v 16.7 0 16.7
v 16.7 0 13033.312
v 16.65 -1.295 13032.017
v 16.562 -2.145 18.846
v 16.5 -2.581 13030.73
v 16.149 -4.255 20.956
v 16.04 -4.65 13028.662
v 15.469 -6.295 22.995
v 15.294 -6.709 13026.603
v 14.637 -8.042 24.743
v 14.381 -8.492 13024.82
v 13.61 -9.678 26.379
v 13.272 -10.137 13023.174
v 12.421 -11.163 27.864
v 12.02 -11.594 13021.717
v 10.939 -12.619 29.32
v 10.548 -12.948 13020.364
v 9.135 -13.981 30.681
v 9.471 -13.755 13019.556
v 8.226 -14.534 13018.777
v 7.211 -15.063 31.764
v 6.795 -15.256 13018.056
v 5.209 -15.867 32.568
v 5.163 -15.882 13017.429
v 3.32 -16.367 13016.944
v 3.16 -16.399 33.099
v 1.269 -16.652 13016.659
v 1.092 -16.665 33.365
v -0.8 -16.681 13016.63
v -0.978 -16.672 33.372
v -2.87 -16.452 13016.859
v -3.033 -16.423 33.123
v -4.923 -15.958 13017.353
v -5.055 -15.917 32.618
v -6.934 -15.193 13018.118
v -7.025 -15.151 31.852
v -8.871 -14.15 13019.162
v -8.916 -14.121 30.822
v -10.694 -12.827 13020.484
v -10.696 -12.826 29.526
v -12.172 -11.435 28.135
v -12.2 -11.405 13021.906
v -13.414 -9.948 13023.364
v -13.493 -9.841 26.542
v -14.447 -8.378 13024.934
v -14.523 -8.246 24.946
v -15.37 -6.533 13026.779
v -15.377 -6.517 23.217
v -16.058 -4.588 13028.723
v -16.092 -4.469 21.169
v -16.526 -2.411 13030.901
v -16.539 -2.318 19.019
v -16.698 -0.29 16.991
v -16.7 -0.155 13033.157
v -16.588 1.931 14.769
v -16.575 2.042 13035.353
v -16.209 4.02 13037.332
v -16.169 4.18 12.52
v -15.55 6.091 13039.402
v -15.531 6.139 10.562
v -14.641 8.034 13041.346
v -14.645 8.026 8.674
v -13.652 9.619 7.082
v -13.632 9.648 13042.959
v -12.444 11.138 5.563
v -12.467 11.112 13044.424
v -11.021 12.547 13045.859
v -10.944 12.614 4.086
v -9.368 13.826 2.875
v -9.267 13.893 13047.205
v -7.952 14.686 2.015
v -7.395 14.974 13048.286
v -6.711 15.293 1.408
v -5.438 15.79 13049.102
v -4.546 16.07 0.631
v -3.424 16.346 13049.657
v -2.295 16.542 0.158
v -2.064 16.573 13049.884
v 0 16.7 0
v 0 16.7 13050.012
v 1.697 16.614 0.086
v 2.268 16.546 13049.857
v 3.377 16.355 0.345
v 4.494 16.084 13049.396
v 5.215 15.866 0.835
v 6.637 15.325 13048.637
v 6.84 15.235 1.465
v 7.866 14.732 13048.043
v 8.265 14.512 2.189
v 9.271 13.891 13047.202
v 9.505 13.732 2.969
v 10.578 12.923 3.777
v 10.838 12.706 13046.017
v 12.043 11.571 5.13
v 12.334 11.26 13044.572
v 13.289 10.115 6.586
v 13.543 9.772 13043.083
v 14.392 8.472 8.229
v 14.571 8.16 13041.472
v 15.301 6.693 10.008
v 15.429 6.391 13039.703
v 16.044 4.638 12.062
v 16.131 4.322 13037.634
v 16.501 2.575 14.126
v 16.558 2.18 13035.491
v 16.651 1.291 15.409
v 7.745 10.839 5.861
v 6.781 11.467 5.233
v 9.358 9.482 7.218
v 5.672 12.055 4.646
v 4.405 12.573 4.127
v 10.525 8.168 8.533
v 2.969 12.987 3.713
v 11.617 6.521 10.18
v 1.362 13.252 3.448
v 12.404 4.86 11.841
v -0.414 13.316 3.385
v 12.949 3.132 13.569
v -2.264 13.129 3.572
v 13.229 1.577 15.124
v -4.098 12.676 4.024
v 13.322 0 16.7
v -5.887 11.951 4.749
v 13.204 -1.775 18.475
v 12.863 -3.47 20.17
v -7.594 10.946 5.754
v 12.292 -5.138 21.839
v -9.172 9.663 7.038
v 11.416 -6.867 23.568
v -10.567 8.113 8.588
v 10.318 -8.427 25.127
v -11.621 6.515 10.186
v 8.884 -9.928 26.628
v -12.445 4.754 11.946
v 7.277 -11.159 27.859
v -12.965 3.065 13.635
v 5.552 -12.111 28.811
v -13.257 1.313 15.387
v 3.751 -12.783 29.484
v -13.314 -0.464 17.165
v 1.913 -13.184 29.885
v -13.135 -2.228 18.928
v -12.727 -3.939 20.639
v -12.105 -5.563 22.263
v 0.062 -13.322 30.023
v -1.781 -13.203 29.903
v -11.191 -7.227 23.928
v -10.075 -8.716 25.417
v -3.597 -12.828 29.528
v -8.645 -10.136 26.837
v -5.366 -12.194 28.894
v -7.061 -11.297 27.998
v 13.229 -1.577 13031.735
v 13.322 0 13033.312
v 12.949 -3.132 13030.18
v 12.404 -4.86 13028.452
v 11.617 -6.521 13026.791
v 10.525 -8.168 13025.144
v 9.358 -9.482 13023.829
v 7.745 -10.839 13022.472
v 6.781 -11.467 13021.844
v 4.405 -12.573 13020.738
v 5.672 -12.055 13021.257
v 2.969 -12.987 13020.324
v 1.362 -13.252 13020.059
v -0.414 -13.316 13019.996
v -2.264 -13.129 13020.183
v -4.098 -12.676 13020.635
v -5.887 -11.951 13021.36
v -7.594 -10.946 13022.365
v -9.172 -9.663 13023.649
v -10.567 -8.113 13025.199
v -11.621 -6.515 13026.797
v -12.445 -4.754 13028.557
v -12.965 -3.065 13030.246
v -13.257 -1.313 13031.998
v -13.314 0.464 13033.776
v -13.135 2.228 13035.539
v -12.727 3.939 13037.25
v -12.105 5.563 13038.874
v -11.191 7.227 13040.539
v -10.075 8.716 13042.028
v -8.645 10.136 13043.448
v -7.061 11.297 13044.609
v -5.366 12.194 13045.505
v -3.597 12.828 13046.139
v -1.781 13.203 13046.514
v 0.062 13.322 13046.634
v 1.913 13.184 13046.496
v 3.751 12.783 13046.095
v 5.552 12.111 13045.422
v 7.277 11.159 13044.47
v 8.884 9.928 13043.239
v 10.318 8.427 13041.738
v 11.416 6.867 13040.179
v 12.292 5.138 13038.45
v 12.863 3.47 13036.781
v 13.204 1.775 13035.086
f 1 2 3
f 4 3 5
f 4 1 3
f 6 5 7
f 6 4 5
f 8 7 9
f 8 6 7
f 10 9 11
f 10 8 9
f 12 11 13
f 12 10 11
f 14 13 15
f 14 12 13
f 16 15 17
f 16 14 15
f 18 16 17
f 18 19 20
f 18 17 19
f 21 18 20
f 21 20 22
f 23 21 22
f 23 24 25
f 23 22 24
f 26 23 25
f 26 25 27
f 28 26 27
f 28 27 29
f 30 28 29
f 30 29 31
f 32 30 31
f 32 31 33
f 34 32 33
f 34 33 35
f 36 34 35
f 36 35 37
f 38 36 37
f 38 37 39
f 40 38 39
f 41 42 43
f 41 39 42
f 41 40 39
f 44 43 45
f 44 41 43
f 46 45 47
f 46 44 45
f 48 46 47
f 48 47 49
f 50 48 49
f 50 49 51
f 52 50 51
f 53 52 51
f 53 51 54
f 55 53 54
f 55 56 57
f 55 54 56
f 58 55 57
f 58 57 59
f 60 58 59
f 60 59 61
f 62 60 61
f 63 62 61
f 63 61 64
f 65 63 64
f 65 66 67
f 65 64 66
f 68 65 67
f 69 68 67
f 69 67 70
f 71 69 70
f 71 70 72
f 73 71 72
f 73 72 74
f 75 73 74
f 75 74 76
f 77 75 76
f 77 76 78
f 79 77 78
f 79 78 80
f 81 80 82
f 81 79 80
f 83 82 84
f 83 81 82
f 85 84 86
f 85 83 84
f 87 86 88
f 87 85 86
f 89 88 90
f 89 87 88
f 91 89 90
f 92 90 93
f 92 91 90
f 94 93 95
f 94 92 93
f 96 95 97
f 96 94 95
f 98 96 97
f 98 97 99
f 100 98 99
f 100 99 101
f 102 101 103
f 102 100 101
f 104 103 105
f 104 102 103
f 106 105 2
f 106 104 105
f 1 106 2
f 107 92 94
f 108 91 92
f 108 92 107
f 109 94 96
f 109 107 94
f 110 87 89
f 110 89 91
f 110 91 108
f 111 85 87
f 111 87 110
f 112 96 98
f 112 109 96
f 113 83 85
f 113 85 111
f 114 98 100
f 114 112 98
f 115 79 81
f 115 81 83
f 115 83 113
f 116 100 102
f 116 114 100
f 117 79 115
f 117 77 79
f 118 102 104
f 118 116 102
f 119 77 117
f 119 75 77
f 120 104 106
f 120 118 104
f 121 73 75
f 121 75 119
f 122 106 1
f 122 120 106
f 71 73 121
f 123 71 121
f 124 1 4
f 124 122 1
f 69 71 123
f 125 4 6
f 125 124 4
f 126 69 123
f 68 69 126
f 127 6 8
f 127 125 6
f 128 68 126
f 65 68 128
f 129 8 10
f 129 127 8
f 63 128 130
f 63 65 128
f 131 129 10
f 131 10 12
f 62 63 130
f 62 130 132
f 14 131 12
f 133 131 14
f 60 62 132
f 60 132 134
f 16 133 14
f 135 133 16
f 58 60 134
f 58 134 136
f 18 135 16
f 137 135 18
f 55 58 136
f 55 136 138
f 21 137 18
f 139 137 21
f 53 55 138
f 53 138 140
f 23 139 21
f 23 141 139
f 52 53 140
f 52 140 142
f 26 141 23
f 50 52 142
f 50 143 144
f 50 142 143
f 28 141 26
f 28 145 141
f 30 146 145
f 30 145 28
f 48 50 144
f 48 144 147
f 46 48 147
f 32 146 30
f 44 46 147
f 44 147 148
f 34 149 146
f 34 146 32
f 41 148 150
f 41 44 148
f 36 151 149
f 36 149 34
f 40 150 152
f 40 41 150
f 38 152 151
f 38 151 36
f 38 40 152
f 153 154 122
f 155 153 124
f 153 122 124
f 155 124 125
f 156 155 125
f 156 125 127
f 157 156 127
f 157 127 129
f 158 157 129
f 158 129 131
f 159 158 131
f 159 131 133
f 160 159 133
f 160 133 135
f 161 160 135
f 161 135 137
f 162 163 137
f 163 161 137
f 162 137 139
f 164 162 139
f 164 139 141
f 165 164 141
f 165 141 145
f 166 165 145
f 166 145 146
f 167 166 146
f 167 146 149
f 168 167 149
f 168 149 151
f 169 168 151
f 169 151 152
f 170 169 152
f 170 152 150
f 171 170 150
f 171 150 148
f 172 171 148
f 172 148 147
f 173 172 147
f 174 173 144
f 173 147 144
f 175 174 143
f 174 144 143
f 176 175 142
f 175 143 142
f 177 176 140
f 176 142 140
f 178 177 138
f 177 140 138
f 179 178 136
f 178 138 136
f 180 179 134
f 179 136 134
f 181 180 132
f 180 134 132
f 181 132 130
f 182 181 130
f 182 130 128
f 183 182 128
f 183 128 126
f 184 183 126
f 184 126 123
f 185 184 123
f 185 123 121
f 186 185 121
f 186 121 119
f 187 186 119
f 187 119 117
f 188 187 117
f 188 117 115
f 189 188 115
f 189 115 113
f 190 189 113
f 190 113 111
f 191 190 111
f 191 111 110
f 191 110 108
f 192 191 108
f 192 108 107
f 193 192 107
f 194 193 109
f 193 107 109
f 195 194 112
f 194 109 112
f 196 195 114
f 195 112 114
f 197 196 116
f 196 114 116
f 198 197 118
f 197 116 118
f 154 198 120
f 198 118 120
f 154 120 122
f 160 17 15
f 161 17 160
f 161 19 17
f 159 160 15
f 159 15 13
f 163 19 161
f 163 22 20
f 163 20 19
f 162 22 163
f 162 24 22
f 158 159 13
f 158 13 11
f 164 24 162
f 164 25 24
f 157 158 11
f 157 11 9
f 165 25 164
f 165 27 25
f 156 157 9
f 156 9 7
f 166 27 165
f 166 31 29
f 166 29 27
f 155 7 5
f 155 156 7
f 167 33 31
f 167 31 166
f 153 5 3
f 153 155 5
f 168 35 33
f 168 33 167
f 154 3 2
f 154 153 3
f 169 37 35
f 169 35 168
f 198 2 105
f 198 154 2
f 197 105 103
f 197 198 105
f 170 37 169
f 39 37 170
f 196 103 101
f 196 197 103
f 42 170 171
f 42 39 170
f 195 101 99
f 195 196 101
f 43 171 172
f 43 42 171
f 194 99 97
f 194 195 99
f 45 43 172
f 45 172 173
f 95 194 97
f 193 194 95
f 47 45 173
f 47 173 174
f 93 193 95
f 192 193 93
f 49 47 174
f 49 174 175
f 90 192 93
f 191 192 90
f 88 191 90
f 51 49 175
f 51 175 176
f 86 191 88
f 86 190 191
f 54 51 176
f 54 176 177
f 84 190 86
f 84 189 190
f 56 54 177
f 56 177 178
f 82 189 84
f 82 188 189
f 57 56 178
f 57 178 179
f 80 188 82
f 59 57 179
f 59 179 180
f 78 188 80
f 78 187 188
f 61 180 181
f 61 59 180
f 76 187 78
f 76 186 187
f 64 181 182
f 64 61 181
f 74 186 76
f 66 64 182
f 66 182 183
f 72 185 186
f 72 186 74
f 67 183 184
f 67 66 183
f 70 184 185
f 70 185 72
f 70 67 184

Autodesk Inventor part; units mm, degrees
ref_plane "Start plane" through (0, 0, 0) normal (0, 0, 1) x (1, 0, 0)
ref_plane "End plane" through (0, 0, 13050.012) normal (0, 0, 1) x (1, 0, 0)
sketch "Sketch" plane through (0, 0, 0) normal (0, 0, 1) x (1, 0, 0)
  circle A0 centre (0, 0) radius 13.3223
  circle A1 centre (0, 0) radius 16.7005
  dimension "d0" = 33.401
  dimension "d1" = 3.3782
extrude "Body" add sketch "Sketch" along normal up to surface (13050.012 mm away) from surface at 0
sketch "Sketch3" plane through (0, 0, 0) normal (0, 0, 1) x (1, 0, 0)
  line L0 (0, 0) -> (10, 0)
ref_plane "Work Plane3" through (0, 0, 0) normal (0, -1, 0) x (1, 0, 0)
sketch "Sketch4" plane through (0, 0, 0) normal (0, -1, 0) x (1, 0, 0)
  line L0 (-2, 0) -> (12, 0)
  line L1 (-2, 13050.012) -> (12, 13050.012)
  dimension "d7" = 13050.012
ref_plane "Work Plane4" through (0, 16.7005, 13050.012) normal (0, -0.7071, 0.7071) x (1, 0, 0)
split "Split1" plane through (0, 16.7005, 13050.012) removes the side toward (0, -0.7071, 0.7071)
ref_plane "Work Plane5" through (0, 16.7005, 0) normal (0, -0.7071, -0.7071) x (1, 0, 0)
split "Split2" plane through (0, 16.7005, 0) removes the side toward (0, -0.7071, -0.7071)
equation "\"d0\" = G_H"
equation "\"d1\" = G_T"
equation "\"d2\" = G_L"
equation "\"G_H\" = 33.401"
equation "\"G_T\" = 3.3782"
equation "\"G_L\" = d7"
equation "\"G_OFFSET_START\" = 0"
equation "\"G_OFFSET_END\" = 33.401"
equation "\"d5\" = G_OFFSET_END + B_L"
equation "\"B_L\" = 13016.611"
properties part number "ANSI 1 x 0.133 00000002" material "Aluminum 6061"
